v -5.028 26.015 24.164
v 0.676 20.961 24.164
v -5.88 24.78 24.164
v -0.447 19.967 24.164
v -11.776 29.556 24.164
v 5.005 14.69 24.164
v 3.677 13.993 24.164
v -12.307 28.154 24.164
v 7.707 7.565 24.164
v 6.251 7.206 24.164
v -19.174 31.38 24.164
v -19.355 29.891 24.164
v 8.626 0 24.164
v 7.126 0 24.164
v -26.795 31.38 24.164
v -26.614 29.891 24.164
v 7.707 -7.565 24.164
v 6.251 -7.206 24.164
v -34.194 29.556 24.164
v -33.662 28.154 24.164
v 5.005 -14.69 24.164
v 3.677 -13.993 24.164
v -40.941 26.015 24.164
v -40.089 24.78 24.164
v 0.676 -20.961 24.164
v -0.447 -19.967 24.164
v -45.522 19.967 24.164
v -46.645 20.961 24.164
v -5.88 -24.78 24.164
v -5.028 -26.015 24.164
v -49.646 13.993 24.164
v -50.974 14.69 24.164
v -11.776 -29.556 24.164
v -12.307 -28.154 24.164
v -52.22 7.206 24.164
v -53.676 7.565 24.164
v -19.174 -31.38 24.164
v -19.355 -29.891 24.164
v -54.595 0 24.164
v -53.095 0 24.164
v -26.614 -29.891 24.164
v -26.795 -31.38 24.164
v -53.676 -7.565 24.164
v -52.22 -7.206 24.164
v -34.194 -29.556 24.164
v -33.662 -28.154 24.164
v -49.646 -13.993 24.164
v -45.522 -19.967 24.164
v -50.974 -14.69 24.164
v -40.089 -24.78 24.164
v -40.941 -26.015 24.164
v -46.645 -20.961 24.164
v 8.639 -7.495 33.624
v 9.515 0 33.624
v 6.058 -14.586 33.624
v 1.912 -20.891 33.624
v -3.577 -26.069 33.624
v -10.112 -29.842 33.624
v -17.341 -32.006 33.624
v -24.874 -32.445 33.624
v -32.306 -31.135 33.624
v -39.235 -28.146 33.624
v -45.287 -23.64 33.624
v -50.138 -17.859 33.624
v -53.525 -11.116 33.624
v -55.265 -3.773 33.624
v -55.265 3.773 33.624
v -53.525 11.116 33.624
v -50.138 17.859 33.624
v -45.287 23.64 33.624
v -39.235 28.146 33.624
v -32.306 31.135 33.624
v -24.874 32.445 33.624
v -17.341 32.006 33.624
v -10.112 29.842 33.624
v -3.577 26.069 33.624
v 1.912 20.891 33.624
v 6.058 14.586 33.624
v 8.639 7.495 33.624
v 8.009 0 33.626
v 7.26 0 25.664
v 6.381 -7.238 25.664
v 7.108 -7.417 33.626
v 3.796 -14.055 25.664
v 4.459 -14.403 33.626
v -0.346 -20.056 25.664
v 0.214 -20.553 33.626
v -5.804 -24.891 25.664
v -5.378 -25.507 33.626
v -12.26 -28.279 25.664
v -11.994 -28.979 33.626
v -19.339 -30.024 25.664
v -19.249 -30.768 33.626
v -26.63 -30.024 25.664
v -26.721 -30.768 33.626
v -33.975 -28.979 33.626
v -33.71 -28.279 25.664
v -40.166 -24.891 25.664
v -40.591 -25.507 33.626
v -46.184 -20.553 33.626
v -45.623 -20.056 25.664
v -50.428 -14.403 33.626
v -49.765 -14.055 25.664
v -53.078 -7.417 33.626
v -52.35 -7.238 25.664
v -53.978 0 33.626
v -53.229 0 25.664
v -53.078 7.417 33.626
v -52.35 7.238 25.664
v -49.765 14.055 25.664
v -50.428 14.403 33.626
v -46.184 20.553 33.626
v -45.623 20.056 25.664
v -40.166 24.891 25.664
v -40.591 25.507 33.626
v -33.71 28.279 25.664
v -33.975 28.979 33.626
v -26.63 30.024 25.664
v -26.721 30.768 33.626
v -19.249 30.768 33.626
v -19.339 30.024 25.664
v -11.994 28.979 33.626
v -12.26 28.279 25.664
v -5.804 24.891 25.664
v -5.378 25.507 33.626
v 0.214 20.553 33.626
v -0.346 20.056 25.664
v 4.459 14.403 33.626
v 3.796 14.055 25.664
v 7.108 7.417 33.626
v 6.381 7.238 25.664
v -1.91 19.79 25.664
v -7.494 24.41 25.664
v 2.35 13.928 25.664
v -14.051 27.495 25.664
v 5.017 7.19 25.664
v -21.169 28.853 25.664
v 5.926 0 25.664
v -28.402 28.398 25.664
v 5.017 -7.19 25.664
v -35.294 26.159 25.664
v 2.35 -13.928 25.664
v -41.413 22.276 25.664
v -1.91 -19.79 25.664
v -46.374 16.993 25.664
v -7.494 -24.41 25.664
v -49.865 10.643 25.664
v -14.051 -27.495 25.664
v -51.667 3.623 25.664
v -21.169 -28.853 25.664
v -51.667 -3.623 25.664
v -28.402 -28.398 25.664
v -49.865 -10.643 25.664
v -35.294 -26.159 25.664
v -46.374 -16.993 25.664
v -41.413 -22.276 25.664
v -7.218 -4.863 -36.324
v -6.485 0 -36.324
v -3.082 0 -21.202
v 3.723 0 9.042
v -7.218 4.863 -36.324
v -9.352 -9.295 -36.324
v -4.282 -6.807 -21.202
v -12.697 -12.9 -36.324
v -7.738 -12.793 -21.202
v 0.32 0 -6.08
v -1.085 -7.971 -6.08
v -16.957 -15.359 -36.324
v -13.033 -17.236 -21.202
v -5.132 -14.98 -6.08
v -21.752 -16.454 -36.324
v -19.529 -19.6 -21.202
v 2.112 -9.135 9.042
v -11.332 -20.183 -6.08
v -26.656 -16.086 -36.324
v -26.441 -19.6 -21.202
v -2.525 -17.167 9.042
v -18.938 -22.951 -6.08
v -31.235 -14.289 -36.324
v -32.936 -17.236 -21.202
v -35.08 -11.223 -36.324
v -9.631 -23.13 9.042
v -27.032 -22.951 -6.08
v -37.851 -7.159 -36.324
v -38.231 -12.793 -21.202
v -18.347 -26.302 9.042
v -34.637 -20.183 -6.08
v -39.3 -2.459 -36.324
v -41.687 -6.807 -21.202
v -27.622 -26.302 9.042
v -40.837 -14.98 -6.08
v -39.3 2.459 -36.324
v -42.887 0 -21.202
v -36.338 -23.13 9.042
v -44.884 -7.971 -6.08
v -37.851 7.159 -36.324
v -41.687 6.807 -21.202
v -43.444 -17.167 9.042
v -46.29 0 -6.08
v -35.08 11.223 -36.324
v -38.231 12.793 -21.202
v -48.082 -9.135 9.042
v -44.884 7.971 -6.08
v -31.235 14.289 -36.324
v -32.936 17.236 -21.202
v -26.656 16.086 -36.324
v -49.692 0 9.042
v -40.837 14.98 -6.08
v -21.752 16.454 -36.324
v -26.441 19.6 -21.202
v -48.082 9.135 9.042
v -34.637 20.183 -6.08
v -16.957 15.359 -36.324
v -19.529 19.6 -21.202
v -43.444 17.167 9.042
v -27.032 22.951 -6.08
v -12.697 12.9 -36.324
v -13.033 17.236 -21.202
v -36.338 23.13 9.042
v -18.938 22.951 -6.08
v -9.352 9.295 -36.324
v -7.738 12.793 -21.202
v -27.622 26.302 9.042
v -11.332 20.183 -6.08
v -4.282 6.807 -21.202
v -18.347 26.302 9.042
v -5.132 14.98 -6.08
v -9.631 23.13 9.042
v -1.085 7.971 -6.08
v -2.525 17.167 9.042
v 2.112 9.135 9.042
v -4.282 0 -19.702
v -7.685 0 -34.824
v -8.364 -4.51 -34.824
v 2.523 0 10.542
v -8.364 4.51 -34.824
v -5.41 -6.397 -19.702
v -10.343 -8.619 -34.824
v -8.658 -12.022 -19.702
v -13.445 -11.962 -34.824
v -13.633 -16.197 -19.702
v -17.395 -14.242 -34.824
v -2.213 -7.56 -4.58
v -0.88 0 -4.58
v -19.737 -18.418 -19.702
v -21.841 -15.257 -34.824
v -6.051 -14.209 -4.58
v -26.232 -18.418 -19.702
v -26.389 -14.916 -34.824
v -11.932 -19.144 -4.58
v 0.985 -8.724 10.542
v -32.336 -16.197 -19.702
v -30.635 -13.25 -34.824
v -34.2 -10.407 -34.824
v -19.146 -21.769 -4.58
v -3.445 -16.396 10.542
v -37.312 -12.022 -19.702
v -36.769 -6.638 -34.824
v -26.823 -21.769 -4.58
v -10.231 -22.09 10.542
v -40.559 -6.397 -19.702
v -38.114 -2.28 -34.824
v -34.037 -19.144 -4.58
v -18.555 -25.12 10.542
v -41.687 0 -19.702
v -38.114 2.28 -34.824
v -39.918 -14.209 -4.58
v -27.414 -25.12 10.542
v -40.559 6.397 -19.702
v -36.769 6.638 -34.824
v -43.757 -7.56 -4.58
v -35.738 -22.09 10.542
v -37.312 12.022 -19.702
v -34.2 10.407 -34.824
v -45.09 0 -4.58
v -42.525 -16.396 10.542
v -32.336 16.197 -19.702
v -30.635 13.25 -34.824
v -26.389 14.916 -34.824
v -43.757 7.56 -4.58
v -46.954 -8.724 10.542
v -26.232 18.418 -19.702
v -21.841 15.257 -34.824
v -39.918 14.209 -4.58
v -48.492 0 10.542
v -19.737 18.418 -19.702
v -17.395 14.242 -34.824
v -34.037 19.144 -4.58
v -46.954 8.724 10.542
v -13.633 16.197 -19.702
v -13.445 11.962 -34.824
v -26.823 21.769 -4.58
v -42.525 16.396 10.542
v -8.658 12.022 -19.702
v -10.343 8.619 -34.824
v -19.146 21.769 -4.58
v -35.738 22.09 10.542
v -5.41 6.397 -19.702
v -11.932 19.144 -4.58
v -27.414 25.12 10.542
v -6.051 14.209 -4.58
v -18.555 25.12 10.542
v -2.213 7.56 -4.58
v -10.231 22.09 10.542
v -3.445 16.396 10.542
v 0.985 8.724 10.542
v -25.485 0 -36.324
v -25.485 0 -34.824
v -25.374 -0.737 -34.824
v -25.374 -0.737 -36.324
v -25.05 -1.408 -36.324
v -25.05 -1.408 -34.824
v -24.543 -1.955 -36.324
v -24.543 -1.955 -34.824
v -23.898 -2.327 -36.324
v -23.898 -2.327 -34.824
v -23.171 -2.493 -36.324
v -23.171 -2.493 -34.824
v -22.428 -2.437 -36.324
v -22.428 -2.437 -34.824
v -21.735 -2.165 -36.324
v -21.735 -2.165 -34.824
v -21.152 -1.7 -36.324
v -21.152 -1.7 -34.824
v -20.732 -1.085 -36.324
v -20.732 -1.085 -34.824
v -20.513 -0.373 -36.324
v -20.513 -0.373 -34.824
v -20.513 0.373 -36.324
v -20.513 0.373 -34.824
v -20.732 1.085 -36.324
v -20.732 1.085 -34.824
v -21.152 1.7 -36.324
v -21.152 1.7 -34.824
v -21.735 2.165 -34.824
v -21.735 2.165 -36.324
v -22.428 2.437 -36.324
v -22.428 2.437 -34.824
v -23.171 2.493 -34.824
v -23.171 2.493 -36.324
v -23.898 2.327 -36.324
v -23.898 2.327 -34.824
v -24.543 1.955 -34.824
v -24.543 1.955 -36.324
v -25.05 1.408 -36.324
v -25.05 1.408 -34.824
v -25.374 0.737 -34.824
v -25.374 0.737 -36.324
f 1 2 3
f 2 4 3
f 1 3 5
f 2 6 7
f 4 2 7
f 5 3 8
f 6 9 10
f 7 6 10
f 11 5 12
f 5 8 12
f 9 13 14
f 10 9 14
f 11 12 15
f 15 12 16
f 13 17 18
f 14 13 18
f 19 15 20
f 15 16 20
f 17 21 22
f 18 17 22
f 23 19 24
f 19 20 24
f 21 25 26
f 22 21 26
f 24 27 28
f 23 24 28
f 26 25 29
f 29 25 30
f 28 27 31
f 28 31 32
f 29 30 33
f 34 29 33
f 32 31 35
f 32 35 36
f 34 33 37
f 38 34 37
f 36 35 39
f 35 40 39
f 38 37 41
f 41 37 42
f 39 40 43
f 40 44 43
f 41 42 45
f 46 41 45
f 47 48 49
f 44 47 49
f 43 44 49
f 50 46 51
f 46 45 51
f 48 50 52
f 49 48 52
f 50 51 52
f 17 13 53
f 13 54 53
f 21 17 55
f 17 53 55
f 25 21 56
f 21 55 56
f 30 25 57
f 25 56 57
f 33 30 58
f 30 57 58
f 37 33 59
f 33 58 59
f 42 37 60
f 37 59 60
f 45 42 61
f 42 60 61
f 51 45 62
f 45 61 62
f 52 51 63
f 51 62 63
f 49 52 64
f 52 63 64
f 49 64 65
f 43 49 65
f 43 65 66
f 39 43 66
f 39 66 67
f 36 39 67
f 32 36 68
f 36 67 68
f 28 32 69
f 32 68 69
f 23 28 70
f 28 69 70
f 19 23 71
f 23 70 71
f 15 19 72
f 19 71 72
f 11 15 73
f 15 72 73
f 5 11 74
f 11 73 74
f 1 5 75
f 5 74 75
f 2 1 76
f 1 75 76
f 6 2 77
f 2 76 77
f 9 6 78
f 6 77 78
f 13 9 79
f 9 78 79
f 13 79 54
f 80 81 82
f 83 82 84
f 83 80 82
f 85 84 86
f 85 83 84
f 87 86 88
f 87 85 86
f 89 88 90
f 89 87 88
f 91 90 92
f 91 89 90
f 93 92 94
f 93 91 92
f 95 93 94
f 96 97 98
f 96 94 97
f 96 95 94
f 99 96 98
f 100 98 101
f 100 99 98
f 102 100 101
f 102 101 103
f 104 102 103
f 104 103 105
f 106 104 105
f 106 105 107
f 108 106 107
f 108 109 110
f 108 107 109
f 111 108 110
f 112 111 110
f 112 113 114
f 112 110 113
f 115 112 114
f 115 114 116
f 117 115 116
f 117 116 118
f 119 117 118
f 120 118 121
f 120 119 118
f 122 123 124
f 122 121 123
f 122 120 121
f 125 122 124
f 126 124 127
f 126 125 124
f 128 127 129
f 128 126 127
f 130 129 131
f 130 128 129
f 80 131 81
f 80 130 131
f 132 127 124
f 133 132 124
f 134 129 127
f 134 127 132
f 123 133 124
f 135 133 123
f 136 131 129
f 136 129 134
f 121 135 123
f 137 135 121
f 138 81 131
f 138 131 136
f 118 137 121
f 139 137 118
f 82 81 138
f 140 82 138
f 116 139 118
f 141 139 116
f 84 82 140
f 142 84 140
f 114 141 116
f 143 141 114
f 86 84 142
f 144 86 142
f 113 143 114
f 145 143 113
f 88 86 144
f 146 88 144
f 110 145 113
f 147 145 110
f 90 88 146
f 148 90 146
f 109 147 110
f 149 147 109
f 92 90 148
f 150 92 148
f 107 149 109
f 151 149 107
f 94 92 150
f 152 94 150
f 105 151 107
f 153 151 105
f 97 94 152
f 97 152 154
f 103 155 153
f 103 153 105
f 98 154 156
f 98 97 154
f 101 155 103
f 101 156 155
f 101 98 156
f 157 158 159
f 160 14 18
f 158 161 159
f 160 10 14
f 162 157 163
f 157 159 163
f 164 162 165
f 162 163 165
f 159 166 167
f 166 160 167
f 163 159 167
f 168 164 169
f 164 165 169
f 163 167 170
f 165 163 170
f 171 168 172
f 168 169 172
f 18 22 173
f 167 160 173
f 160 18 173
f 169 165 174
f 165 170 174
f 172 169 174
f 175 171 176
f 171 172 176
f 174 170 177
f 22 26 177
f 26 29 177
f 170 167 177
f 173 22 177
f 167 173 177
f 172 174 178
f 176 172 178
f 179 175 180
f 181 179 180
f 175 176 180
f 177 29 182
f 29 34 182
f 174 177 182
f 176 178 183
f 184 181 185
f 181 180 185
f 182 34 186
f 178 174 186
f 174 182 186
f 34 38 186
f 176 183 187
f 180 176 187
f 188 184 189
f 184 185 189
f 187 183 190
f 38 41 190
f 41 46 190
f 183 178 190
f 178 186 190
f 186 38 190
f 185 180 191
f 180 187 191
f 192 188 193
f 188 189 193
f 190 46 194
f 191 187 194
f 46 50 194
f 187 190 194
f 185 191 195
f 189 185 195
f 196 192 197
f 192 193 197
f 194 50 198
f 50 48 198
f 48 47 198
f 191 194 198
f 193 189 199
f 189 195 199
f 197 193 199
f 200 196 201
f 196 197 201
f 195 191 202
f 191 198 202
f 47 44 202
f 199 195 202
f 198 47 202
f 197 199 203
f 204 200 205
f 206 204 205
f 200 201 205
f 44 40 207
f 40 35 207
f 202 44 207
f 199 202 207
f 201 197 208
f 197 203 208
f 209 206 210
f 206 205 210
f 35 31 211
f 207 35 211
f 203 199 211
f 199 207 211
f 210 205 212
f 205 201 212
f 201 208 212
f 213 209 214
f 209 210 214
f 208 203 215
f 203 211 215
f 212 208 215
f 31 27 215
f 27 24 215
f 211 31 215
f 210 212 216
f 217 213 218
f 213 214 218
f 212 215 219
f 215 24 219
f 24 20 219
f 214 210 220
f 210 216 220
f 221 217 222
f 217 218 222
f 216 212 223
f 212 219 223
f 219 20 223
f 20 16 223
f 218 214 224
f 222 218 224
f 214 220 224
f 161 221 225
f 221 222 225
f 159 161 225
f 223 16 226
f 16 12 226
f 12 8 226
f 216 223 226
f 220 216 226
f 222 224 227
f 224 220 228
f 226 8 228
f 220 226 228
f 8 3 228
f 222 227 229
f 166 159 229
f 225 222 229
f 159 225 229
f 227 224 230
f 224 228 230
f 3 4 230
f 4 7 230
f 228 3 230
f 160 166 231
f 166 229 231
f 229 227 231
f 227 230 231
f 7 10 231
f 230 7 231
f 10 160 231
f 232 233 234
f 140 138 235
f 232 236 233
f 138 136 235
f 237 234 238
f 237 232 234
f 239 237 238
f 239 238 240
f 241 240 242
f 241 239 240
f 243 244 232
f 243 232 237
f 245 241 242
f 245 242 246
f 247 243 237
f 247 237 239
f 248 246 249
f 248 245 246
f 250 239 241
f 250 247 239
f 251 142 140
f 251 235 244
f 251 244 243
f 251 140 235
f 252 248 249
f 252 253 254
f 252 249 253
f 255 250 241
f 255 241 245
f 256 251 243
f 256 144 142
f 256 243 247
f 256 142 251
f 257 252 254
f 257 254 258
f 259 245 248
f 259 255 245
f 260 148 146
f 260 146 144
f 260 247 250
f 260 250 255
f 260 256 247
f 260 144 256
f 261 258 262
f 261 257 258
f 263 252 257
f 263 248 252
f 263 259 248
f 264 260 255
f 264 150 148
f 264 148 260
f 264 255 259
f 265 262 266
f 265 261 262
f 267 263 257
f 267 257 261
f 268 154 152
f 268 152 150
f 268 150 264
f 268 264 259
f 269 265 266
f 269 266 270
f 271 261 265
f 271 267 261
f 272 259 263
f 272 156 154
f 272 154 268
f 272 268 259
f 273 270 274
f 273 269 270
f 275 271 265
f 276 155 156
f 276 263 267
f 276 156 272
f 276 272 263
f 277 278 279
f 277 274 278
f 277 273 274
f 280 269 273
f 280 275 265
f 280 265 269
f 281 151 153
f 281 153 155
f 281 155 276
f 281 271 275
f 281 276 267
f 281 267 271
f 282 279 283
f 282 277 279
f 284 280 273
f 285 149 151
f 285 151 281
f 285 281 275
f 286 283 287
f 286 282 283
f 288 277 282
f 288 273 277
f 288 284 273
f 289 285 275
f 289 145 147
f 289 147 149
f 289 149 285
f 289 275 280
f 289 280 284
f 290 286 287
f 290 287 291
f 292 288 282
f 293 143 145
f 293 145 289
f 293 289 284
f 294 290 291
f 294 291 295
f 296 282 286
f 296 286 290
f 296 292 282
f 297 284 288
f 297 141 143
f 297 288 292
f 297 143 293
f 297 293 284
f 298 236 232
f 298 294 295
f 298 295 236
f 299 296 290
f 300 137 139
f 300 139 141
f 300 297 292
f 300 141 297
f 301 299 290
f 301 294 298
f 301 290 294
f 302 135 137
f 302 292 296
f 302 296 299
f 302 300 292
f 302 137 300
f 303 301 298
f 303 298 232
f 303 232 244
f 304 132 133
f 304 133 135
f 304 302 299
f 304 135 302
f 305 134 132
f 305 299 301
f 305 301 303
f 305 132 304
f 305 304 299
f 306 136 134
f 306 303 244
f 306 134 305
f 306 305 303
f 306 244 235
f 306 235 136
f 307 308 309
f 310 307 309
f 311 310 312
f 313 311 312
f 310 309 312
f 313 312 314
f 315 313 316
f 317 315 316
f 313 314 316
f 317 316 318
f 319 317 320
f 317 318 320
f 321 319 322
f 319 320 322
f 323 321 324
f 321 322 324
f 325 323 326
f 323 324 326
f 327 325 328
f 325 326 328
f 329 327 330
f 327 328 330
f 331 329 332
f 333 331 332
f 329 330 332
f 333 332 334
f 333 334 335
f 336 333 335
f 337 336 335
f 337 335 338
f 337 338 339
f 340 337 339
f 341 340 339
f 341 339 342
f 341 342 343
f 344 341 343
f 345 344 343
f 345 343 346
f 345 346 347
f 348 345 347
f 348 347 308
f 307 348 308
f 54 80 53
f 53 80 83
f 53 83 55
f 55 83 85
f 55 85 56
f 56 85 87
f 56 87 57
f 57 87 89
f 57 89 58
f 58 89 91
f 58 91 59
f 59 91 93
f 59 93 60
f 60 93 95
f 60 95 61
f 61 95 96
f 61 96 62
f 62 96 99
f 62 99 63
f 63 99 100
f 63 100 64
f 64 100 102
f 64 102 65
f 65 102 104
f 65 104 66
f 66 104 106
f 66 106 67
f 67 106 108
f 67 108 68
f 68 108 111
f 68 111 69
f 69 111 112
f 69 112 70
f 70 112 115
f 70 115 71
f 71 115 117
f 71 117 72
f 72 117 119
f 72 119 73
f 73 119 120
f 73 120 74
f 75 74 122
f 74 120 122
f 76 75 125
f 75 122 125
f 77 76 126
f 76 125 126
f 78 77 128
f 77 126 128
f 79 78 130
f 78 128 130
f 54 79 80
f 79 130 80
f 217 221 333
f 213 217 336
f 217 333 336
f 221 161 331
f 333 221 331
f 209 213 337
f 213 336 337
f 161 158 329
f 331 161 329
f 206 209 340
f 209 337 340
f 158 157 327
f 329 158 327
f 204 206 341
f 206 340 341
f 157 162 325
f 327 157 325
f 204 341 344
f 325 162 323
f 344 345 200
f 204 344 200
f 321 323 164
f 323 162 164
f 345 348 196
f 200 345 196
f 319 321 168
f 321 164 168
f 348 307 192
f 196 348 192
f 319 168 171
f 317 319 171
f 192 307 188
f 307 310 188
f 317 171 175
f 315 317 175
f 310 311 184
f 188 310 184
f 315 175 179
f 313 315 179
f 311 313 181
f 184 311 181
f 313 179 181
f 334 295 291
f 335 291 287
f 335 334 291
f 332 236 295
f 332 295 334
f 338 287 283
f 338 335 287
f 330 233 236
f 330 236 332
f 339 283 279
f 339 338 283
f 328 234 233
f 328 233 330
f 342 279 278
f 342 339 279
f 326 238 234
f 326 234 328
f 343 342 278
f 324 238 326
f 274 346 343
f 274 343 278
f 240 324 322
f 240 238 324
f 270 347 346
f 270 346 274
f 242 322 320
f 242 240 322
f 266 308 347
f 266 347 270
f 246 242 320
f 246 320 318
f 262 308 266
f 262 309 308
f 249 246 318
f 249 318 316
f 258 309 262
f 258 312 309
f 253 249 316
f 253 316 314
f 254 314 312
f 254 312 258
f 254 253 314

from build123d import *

# Parameters (mm, degrees)
F2_T = -1.5
F4_D = 5


with BuildPart() as f1:
    # F0 (on Front) → F1 (revolve)
    with BuildSketch(Plane.XZ):
        Polygon((-22.9846419008, 33.67621309), (-22.9846419008, -36.32378691), (-6.4846419008, -36.32378691), (7.1255733644, 24.1639146534), (8.6255733644, 24.1639146534), (9.515315591, 33.62364854), align=None)
    revolve(axis=Axis((-22.9846419008, 0, -1.32378691), (0, 0, -1)))

    # F2
    f2_openings = [f1.faces().sort_by_distance(p)[0] for p in [
        (-39.234621, 0, 33.649931),
    ]]
    offset(amount=F2_T, openings=f2_openings, kind=Kind.INTERSECTION)

    # F4 (through all)
    with Locations(Plane(origin=(0, 0, -36.32378691), x_dir=(1, 0, 0), z_dir=(0, 0, -1))):
        with Locations((-22.9846419008, 0)):
            Hole(F4_D / 2)


solid = f1.part
